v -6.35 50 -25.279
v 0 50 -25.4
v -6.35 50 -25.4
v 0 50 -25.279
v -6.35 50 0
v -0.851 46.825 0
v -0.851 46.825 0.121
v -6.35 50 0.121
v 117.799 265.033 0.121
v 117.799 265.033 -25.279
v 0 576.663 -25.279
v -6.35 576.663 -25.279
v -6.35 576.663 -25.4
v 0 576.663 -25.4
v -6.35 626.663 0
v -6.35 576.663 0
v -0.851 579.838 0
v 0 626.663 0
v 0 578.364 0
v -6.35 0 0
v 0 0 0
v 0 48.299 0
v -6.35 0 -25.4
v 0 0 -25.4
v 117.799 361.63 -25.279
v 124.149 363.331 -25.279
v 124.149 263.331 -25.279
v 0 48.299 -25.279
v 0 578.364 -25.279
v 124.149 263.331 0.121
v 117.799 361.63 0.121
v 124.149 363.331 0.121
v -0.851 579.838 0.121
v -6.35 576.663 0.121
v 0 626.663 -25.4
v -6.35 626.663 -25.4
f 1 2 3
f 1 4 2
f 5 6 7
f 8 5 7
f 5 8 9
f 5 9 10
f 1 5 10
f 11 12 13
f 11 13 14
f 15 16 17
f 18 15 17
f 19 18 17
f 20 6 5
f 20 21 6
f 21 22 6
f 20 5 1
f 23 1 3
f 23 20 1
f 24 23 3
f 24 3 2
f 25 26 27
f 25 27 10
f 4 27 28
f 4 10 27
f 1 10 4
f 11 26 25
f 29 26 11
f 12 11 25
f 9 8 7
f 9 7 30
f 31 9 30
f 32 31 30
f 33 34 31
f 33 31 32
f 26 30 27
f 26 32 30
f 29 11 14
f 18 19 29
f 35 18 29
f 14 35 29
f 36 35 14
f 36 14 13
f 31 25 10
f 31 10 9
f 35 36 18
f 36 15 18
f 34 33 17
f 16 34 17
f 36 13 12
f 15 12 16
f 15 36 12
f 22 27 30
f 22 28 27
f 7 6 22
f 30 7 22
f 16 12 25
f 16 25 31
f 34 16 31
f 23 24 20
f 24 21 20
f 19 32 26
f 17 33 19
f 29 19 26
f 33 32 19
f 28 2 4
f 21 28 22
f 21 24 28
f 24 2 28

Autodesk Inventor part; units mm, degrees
ref_plane "YZ Plane" through (0, 0, 0) normal (1, 0, 0) x (0, 1, 0)
sketch "Sketch1" plane through (0, 0, 0) normal (0, 1, 0) x (-1, 0, 0)
  line L0 (0, 0) -> (6.35, 0)
  line L1 (6.35, 0) -> (6.35, -25.4)
  line L2 (6.35, -25.4) -> (0, -25.4)
  line L3 (0, -25.4) -> (0, 0)
  dimension "d0" = 6.35
  dimension "d1" = 25.4
extrude "Extrusion1" add sketch "Sketch1" along normal blind 50
sketch "Sketch2" plane through (0, 50, 0) normal (0, 1, 0) x (1, 0, 0)
  point P0 (0, 0)
ref_plane "Work Plane2" through (-6.35, 50, -25.4) normal (0.5, 0.866, 0) x (0, 0, 1)
sketch "Sketch3" plane through (-6.35, 50, -25.4) normal (0.5, 0.866, 0) x (0, 0, 1)
  line L0 (25.5214, 0) -> (0.1214, 0)
  line L1 (0.1214, 0) -> (0.1214, 6.35)
  line L2 (0.1214, 6.35) -> (25.5214, 6.35)
  line L3 (25.5214, 6.35) -> (25.5214, 0)
  point P0 (25.4, 30.4993)
  dimension "d5" = 25.4
  dimension "d6" = 6.35
extrude "Extrusion2" add sketch "Sketch3" along normal blind 250
ref_plane "Work Plane3" through (124.1493, 263.3314, 0.1214) normal (0, 1, 0) x (0, 0, -1)
sketch "Sketch4" plane through (124.1493, 263.3314, 0.1214) normal (0, 1, 0) x (0, 0, -1)
  line L0 (25.4, 124.1493) -> (25.4, 0) projected
  line L1 (25.4, 0) -> (0, 0)
  line L2 (0, 0) -> (0, 6.35)
  line L3 (0, 6.35) -> (25.4, 6.35)
  line L4 (25.4, 6.35) -> (25.4, 0)
  point P0 (0.1214, 124.1493)
  point P1 (25.4, 6.35)
  dimension "d10" = 25.4
  dimension "d11" = 6.35
extrude "Extrusion3" add sketch "Sketch4" along normal blind 50
mirror "Mirror1" about plane through (120.9743, 313.3314, -12.5786) normal (0, 1, 0) of "Extrusion1", "Extrusion2", "Extrusion3"
properties part number "AçoChato"
